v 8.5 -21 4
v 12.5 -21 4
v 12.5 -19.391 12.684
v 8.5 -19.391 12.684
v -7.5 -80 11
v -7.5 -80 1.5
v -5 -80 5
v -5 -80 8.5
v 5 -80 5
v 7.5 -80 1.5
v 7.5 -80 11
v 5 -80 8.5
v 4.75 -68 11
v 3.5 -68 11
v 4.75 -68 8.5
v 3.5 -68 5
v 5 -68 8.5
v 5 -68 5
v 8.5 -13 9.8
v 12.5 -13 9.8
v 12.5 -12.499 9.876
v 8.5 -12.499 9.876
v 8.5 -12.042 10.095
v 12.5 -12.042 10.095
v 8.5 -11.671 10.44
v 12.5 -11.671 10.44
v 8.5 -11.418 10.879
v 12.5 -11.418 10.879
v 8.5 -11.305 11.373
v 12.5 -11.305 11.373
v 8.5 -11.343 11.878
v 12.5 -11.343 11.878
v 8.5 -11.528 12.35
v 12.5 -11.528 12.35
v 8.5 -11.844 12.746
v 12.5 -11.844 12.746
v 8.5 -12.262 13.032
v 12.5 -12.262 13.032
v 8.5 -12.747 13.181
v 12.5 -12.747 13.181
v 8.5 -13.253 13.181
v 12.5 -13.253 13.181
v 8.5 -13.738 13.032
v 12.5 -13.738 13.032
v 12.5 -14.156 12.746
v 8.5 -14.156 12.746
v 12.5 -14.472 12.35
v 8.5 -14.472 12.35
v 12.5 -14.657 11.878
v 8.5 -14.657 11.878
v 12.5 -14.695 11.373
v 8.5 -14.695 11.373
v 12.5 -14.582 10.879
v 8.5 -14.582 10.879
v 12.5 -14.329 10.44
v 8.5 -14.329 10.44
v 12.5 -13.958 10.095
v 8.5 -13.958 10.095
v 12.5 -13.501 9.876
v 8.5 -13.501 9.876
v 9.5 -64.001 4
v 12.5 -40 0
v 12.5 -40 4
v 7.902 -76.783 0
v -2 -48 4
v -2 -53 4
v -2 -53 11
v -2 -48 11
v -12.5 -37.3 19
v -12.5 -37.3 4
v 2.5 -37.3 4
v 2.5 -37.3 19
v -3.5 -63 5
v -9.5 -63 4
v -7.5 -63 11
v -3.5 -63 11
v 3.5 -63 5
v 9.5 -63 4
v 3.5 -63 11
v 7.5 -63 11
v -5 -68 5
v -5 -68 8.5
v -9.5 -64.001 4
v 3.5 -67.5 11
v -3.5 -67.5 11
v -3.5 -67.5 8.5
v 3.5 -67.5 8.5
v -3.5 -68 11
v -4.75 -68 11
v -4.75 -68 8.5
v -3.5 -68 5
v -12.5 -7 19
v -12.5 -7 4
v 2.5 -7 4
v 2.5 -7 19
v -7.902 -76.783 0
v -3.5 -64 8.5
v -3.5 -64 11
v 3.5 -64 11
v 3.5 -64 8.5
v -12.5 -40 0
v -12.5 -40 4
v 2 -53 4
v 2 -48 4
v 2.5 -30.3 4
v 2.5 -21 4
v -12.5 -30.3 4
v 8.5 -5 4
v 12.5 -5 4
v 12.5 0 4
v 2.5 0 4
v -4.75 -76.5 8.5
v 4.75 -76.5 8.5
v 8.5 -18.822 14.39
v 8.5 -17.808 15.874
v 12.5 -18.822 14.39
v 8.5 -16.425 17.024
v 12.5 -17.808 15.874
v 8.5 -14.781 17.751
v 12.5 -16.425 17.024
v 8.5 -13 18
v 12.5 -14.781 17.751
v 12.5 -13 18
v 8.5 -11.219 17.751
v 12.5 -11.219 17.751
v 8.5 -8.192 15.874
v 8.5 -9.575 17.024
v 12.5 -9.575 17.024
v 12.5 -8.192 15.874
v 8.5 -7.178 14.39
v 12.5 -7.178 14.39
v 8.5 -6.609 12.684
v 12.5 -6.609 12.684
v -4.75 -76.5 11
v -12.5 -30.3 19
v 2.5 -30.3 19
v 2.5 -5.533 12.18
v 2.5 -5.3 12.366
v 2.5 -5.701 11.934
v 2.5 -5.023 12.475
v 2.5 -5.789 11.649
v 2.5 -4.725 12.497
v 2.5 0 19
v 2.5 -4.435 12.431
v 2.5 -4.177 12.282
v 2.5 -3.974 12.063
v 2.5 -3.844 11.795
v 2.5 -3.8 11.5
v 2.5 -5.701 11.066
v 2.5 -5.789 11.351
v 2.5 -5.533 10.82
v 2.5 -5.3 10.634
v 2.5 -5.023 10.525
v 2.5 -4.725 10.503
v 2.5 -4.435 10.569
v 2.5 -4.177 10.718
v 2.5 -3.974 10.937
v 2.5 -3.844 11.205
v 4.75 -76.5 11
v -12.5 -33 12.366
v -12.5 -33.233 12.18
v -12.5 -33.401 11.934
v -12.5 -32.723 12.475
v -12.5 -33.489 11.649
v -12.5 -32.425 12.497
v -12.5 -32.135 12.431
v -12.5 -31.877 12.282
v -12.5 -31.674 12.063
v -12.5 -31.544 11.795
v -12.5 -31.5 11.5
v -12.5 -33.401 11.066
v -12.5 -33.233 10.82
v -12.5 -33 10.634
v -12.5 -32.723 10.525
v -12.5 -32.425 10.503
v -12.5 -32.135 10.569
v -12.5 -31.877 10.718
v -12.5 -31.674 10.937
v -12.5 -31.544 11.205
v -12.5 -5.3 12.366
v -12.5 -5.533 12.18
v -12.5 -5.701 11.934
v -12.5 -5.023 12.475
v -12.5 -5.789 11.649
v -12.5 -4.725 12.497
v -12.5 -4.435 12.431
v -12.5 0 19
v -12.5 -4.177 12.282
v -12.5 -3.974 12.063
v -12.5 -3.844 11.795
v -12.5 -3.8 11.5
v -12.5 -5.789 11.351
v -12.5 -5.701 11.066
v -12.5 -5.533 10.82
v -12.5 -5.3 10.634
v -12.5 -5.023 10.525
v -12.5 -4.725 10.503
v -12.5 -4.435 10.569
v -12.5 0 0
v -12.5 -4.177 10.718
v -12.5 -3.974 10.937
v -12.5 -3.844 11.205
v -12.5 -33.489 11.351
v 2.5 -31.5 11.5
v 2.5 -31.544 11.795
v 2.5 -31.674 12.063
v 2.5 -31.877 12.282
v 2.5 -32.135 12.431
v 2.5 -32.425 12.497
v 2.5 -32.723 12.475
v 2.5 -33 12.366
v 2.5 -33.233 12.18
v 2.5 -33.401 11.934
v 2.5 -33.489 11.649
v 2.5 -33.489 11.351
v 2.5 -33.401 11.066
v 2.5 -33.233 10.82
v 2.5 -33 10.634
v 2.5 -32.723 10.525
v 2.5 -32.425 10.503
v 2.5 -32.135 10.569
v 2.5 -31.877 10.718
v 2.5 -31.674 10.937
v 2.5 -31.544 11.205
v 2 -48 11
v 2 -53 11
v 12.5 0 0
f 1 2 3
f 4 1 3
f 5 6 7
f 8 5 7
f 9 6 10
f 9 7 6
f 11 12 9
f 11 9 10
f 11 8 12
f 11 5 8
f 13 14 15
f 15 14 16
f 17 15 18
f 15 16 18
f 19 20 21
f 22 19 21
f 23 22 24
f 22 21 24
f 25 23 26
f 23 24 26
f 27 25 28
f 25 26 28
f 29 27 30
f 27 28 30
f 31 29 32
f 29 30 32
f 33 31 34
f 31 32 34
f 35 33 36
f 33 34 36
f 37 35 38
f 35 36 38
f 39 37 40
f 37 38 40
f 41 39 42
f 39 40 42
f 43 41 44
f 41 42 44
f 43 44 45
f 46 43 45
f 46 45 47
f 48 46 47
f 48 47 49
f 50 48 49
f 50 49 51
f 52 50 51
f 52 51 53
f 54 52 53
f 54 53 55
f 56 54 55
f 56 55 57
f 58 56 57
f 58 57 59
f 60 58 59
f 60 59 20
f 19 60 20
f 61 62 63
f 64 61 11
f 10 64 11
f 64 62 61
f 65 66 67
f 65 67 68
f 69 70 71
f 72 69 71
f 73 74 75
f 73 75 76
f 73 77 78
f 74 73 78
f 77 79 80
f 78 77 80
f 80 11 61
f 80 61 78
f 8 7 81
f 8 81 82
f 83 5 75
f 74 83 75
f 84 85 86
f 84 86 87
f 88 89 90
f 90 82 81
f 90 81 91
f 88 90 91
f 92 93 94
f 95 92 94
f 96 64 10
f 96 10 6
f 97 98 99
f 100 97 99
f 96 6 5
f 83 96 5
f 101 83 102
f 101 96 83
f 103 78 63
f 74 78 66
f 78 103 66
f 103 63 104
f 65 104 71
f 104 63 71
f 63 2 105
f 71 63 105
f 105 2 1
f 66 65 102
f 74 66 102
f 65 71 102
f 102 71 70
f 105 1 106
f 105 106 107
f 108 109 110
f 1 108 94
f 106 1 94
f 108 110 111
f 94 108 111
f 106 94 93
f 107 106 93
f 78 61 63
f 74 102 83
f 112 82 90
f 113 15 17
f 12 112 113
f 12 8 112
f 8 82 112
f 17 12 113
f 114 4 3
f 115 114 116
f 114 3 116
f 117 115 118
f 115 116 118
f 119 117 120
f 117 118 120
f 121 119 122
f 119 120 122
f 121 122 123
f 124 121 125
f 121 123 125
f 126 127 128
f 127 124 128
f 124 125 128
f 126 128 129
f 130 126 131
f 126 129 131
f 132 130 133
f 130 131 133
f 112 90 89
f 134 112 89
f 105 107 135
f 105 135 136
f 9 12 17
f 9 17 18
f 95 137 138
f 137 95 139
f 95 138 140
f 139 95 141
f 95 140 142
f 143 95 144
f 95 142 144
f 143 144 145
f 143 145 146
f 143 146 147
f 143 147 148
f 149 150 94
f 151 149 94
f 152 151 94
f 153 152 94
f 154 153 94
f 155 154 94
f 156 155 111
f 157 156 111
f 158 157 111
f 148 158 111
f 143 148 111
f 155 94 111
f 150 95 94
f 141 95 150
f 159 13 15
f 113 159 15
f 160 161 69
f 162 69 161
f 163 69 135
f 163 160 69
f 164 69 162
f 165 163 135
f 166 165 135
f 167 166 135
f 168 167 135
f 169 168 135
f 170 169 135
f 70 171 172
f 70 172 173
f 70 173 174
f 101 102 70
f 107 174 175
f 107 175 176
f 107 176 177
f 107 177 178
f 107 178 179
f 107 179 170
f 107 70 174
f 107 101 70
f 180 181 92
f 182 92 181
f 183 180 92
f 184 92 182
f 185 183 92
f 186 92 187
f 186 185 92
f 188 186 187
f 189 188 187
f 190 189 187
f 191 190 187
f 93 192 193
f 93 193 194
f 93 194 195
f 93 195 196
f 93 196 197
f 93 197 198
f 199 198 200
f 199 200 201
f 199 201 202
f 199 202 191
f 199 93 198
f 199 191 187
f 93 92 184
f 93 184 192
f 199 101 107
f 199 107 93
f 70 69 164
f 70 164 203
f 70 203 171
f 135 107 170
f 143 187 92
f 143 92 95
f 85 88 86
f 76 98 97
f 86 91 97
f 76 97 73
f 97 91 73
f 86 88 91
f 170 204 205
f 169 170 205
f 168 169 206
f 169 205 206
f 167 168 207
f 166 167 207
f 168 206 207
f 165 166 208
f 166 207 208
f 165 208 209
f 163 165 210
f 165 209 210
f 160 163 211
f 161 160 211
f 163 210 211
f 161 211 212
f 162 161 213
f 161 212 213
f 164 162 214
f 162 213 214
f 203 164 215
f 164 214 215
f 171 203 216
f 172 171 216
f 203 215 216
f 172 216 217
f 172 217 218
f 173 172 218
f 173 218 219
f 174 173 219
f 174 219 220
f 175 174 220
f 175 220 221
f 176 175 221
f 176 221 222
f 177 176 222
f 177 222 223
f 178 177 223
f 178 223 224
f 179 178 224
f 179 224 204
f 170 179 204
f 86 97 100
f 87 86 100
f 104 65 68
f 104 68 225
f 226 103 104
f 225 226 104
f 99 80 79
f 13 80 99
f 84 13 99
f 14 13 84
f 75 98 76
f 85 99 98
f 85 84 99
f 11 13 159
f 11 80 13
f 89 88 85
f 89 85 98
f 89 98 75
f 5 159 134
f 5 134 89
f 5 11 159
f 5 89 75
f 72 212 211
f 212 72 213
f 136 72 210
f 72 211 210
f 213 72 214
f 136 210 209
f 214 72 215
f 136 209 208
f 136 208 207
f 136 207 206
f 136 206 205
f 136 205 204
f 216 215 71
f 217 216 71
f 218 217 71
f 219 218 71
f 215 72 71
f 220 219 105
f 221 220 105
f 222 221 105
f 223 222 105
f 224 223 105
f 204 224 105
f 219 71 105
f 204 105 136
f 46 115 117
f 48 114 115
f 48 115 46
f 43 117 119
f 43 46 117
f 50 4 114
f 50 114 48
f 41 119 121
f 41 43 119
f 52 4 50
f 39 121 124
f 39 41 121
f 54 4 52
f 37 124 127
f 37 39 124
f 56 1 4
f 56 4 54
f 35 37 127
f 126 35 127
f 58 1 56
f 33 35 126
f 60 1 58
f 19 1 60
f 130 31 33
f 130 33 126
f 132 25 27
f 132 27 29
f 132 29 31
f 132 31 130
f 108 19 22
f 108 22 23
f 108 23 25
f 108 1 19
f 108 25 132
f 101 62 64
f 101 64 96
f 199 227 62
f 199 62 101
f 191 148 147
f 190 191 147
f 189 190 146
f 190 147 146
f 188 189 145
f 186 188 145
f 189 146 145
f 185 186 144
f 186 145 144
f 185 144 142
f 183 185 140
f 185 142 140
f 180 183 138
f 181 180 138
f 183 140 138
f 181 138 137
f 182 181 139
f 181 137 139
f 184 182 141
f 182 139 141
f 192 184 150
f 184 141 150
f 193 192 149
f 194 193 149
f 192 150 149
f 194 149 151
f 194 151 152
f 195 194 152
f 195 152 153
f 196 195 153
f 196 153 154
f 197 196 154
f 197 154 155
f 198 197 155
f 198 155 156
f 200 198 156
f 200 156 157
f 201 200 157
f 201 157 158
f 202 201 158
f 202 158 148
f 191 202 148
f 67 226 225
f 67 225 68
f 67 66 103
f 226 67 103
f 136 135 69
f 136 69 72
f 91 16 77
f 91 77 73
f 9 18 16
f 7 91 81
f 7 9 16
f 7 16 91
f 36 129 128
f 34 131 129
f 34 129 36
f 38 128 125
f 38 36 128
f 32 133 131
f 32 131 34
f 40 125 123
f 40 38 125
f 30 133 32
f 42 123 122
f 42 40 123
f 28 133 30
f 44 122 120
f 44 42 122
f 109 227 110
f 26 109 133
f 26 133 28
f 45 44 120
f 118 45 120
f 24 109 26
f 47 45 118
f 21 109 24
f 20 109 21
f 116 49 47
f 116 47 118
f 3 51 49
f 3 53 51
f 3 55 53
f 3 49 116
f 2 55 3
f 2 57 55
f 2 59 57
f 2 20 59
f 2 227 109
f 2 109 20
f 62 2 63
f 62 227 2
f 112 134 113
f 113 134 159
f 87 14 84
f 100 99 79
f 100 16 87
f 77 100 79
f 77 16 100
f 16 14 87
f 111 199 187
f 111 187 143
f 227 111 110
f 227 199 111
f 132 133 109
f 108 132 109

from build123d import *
from OCP.BRepFilletAPI import BRepFilletAPI_MakeChamfer

# Parameters (mm, degrees)
RESSALTO_EXTRUS_O1_DEPTH = 4
ESBO_O2_W                = 15
ESBO_O2_H                = 7
ESBO_O2_W_2              = 4
ESBO_O2_H_2              = 16
RESSALTO_EXTRUS_O2_DEPTH = 15
ESBO_O3_R                = 1
CORTE_EXTRUS_O1_DEPTH    = 84.582294776
ESBO_O10_R               = 1.7
CORTE_EXTRUS_O4_DEPTH    = 10
RESSALTO_EXTRUS_O3_DEPTH = 17
RESSALTO_EXTRUS_O4_REACH = 84.348
ESBO_O7_W                = 4
ESBO_O7_H                = 5
ESBO_O8_W                = 15
ESBO_O8_H                = 3.5
RESSALTO_EXTRUS_O5_DEPTH = 2.5
CHANFRO2_SIZE            = 7
CHANFRO2_SIZE_2          = 2
CHANFRO3_SIZE            = 1.5
CHANFRO3_SIZE2           = 3.216760381


with BuildPart() as part:
    # Esboço1 → Ressalto-extrusão1 (new body)
    with BuildSketch(Plane.XY):
        Polygon((-12.5, 0), (12.5, 0), (12.5, -40), (7.5, -80), (-7.5, -80), (-12.5, -40), align=None)
    extrude(amount=RESSALTO_EXTRUS_O1_DEPTH)

    # Esboço2 → Ressalto-extrusão2 (add)
    with BuildSketch(Plane.XY.offset(4)):
        with Locations((-5, -33.8)):
            Rectangle(ESBO_O2_W, ESBO_O2_H)
        with Locations((-5, -3.5)):
            Rectangle(ESBO_O2_W, ESBO_O2_H)
        with Locations((10.5, -13)):
            Rectangle(ESBO_O2_W_2, ESBO_O2_H_2)
    extrude(amount=RESSALTO_EXTRUS_O2_DEPTH)

    # Esboço3 → Corte-extrusão1 (cut, through all)
    with BuildSketch(Plane(origin=(2.5, 0, 0), x_dir=(0, 0, -1), z_dir=(1, 0, 0))):
        with Locations(Location((-11.5, -4.8, 0), (0, 0, 90))):
            Circle(ESBO_O3_R)
        with Locations(Location((-11.5, -32.5, 0), (0, 0, 90))):
            Circle(ESBO_O3_R)
    extrude(amount=-CORTE_EXTRUS_O1_DEPTH, mode=Mode.SUBTRACT)

    # Esboço10 → Corte-extrusão4 (cut)
    with BuildSketch(Plane(origin=(12.5, 0, 0), x_dir=(0, 0, -1), z_dir=(1, 0, 0))):
        with Locations((-11.5, -13)):
            Circle(ESBO_O10_R)
        with BuildLine():
            Line((-4, -5), (-19, -5))
            Line((-19, -5), (-19, -21))
            Line((-19, -21), (-4, -21))
            Line((-4, -21), (-12.684004699, -19.391254405))
            ThreePointArc((-12.684004699, -19.391254405), (-18, -13), (-12.684004699, -6.608745595))
            Line((-12.684004699, -6.608745595), (-4, -5))
        make_face()
    extrude(amount=-CORTE_EXTRUS_O4_DEPTH, mode=Mode.SUBTRACT)

    # Esboço6 → Ressalto-extrusão3 (add)
    with BuildSketch(Plane.XZ.offset(80)):
        Polygon((-5, 5), (-5, 8.5), (-4.75, 8.5), (-4.75, 11), (-7.5, 11), (-7.5, 4), (7.5, 4), (7.5, 11), (4.75, 11), (4.75, 8.5), (5, 8.5), (5, 5), align=None)
    extrude(amount=-RESSALTO_EXTRUS_O3_DEPTH)

    # Ressalto-extrusão4: up to this face of the body (flat: up to its plane)
    ressalto_extrus_o4_end = Plane(part.part.faces().sort_by_distance((-6.125, -71.5, 11))[0])
    # Esboço7 → Ressalto-extrusão4 (add, up to the picked face)
    with BuildSketch(Plane.XY.offset(4), mode=Mode.PRIVATE) as ressalto_extrus_o4_sk1:
        with Locations((0, -50.5)):
            Rectangle(ESBO_O7_W, ESBO_O7_H)
    ressalto_extrus_o4_tool1 = split(extrude(ressalto_extrus_o4_sk1.sketch, amount=RESSALTO_EXTRUS_O4_REACH, mode=Mode.PRIVATE), bisect_by=ressalto_extrus_o4_end, keep=Keep.BOTH, mode=Mode.PRIVATE)
    # Esboço7 → Ressalto-extrusão4 (add, up to the picked face)
    with BuildSketch(Plane.XY.offset(4), mode=Mode.PRIVATE) as ressalto_extrus_o4_sk2:
        with Locations((5.5, -65.5)):
            Rectangle(ESBO_O7_W, ESBO_O7_H)
    ressalto_extrus_o4_tool2 = split(extrude(ressalto_extrus_o4_sk2.sketch, amount=RESSALTO_EXTRUS_O4_REACH, mode=Mode.PRIVATE), bisect_by=ressalto_extrus_o4_end, keep=Keep.BOTH, mode=Mode.PRIVATE)
    # Esboço7 → Ressalto-extrusão4 (add, up to the picked face)
    with BuildSketch(Plane.XY.offset(4), mode=Mode.PRIVATE) as ressalto_extrus_o4_sk3:
        with Locations((-5.5, -65.5)):
            Rectangle(ESBO_O7_W, ESBO_O7_H)
    ressalto_extrus_o4_tool3 = split(extrude(ressalto_extrus_o4_sk3.sketch, amount=RESSALTO_EXTRUS_O4_REACH, mode=Mode.PRIVATE), bisect_by=ressalto_extrus_o4_end, keep=Keep.BOTH, mode=Mode.PRIVATE)
    add(ressalto_extrus_o4_tool1.solids().sort_by(Axis((0, -50.5, 4), (0, 0, 1)))[0])
    add(ressalto_extrus_o4_tool2.solids().sort_by(Axis((5.5, -65.5, 4), (0, 0, 1)))[0])
    add(ressalto_extrus_o4_tool3.solids().sort_by(Axis((-5.5, -65.5, 4), (0, 0, 1)))[0])

    # Esboço8 → Ressalto-extrusão5 (add)
    with BuildSketch(Plane.XY.offset(11)):
        with Locations((0, -78.25)):
            Rectangle(ESBO_O8_W, ESBO_O8_H)
        with Locations((0, -65.75)):
            Rectangle(ESBO_O8_W, ESBO_O8_H)
    extrude(amount=-RESSALTO_EXTRUS_O5_DEPTH)

    # Chanfro2
    chanfro2_edges_1 = [part.edges().sort_by_distance(p)[0] for p in [
        (7.5, -71.5, 4),
    ]]
    chanfro2_side_1 = [part.faces().sort_by_distance(p)[0] for p in [
        (7.5, -71.5, 4.04),
    ]]
    chanfro2_edges_2 = [part.edges().sort_by_distance(p)[0] for p in [
        (-7.5, -71.5, 4),
    ]]
    chanfro2_side_2 = [part.faces().sort_by_distance(p)[0] for p in [
        (-7.5, -71.5, 4.04),
    ]]
    chanfro2 = BRepFilletAPI_MakeChamfer(part.part.solid().wrapped)
    for e in chanfro2_edges_1:
        chanfro2.Add(CHANFRO2_SIZE - 0.0001, CHANFRO2_SIZE_2 - 0.0001, e.wrapped, chanfro2_side_1[0].wrapped)
    for e in chanfro2_edges_2:
        chanfro2.Add(CHANFRO2_SIZE - 0.0001, CHANFRO2_SIZE_2 - 0.0001, e.wrapped, chanfro2_side_2[0].wrapped)
    add(Compound.cast(chanfro2.Shape()), mode=Mode.REPLACE)  # a hair under: the kernel refuses the full size

    # Chanfro3
    chanfro3_edges = [part.edges().sort_by_distance(p)[0] for p in [
        (0, -80, 0),
    ]]
    chanfro3_side = [part.faces().sort_by_distance(p)[0] for p in [
        (7.313989248, -80, 10.99995),
    ]]
    chamfer(chanfro3_edges, length=CHANFRO3_SIZE, length2=CHANFRO3_SIZE2, reference=chanfro3_side[0])


solid = part.part
